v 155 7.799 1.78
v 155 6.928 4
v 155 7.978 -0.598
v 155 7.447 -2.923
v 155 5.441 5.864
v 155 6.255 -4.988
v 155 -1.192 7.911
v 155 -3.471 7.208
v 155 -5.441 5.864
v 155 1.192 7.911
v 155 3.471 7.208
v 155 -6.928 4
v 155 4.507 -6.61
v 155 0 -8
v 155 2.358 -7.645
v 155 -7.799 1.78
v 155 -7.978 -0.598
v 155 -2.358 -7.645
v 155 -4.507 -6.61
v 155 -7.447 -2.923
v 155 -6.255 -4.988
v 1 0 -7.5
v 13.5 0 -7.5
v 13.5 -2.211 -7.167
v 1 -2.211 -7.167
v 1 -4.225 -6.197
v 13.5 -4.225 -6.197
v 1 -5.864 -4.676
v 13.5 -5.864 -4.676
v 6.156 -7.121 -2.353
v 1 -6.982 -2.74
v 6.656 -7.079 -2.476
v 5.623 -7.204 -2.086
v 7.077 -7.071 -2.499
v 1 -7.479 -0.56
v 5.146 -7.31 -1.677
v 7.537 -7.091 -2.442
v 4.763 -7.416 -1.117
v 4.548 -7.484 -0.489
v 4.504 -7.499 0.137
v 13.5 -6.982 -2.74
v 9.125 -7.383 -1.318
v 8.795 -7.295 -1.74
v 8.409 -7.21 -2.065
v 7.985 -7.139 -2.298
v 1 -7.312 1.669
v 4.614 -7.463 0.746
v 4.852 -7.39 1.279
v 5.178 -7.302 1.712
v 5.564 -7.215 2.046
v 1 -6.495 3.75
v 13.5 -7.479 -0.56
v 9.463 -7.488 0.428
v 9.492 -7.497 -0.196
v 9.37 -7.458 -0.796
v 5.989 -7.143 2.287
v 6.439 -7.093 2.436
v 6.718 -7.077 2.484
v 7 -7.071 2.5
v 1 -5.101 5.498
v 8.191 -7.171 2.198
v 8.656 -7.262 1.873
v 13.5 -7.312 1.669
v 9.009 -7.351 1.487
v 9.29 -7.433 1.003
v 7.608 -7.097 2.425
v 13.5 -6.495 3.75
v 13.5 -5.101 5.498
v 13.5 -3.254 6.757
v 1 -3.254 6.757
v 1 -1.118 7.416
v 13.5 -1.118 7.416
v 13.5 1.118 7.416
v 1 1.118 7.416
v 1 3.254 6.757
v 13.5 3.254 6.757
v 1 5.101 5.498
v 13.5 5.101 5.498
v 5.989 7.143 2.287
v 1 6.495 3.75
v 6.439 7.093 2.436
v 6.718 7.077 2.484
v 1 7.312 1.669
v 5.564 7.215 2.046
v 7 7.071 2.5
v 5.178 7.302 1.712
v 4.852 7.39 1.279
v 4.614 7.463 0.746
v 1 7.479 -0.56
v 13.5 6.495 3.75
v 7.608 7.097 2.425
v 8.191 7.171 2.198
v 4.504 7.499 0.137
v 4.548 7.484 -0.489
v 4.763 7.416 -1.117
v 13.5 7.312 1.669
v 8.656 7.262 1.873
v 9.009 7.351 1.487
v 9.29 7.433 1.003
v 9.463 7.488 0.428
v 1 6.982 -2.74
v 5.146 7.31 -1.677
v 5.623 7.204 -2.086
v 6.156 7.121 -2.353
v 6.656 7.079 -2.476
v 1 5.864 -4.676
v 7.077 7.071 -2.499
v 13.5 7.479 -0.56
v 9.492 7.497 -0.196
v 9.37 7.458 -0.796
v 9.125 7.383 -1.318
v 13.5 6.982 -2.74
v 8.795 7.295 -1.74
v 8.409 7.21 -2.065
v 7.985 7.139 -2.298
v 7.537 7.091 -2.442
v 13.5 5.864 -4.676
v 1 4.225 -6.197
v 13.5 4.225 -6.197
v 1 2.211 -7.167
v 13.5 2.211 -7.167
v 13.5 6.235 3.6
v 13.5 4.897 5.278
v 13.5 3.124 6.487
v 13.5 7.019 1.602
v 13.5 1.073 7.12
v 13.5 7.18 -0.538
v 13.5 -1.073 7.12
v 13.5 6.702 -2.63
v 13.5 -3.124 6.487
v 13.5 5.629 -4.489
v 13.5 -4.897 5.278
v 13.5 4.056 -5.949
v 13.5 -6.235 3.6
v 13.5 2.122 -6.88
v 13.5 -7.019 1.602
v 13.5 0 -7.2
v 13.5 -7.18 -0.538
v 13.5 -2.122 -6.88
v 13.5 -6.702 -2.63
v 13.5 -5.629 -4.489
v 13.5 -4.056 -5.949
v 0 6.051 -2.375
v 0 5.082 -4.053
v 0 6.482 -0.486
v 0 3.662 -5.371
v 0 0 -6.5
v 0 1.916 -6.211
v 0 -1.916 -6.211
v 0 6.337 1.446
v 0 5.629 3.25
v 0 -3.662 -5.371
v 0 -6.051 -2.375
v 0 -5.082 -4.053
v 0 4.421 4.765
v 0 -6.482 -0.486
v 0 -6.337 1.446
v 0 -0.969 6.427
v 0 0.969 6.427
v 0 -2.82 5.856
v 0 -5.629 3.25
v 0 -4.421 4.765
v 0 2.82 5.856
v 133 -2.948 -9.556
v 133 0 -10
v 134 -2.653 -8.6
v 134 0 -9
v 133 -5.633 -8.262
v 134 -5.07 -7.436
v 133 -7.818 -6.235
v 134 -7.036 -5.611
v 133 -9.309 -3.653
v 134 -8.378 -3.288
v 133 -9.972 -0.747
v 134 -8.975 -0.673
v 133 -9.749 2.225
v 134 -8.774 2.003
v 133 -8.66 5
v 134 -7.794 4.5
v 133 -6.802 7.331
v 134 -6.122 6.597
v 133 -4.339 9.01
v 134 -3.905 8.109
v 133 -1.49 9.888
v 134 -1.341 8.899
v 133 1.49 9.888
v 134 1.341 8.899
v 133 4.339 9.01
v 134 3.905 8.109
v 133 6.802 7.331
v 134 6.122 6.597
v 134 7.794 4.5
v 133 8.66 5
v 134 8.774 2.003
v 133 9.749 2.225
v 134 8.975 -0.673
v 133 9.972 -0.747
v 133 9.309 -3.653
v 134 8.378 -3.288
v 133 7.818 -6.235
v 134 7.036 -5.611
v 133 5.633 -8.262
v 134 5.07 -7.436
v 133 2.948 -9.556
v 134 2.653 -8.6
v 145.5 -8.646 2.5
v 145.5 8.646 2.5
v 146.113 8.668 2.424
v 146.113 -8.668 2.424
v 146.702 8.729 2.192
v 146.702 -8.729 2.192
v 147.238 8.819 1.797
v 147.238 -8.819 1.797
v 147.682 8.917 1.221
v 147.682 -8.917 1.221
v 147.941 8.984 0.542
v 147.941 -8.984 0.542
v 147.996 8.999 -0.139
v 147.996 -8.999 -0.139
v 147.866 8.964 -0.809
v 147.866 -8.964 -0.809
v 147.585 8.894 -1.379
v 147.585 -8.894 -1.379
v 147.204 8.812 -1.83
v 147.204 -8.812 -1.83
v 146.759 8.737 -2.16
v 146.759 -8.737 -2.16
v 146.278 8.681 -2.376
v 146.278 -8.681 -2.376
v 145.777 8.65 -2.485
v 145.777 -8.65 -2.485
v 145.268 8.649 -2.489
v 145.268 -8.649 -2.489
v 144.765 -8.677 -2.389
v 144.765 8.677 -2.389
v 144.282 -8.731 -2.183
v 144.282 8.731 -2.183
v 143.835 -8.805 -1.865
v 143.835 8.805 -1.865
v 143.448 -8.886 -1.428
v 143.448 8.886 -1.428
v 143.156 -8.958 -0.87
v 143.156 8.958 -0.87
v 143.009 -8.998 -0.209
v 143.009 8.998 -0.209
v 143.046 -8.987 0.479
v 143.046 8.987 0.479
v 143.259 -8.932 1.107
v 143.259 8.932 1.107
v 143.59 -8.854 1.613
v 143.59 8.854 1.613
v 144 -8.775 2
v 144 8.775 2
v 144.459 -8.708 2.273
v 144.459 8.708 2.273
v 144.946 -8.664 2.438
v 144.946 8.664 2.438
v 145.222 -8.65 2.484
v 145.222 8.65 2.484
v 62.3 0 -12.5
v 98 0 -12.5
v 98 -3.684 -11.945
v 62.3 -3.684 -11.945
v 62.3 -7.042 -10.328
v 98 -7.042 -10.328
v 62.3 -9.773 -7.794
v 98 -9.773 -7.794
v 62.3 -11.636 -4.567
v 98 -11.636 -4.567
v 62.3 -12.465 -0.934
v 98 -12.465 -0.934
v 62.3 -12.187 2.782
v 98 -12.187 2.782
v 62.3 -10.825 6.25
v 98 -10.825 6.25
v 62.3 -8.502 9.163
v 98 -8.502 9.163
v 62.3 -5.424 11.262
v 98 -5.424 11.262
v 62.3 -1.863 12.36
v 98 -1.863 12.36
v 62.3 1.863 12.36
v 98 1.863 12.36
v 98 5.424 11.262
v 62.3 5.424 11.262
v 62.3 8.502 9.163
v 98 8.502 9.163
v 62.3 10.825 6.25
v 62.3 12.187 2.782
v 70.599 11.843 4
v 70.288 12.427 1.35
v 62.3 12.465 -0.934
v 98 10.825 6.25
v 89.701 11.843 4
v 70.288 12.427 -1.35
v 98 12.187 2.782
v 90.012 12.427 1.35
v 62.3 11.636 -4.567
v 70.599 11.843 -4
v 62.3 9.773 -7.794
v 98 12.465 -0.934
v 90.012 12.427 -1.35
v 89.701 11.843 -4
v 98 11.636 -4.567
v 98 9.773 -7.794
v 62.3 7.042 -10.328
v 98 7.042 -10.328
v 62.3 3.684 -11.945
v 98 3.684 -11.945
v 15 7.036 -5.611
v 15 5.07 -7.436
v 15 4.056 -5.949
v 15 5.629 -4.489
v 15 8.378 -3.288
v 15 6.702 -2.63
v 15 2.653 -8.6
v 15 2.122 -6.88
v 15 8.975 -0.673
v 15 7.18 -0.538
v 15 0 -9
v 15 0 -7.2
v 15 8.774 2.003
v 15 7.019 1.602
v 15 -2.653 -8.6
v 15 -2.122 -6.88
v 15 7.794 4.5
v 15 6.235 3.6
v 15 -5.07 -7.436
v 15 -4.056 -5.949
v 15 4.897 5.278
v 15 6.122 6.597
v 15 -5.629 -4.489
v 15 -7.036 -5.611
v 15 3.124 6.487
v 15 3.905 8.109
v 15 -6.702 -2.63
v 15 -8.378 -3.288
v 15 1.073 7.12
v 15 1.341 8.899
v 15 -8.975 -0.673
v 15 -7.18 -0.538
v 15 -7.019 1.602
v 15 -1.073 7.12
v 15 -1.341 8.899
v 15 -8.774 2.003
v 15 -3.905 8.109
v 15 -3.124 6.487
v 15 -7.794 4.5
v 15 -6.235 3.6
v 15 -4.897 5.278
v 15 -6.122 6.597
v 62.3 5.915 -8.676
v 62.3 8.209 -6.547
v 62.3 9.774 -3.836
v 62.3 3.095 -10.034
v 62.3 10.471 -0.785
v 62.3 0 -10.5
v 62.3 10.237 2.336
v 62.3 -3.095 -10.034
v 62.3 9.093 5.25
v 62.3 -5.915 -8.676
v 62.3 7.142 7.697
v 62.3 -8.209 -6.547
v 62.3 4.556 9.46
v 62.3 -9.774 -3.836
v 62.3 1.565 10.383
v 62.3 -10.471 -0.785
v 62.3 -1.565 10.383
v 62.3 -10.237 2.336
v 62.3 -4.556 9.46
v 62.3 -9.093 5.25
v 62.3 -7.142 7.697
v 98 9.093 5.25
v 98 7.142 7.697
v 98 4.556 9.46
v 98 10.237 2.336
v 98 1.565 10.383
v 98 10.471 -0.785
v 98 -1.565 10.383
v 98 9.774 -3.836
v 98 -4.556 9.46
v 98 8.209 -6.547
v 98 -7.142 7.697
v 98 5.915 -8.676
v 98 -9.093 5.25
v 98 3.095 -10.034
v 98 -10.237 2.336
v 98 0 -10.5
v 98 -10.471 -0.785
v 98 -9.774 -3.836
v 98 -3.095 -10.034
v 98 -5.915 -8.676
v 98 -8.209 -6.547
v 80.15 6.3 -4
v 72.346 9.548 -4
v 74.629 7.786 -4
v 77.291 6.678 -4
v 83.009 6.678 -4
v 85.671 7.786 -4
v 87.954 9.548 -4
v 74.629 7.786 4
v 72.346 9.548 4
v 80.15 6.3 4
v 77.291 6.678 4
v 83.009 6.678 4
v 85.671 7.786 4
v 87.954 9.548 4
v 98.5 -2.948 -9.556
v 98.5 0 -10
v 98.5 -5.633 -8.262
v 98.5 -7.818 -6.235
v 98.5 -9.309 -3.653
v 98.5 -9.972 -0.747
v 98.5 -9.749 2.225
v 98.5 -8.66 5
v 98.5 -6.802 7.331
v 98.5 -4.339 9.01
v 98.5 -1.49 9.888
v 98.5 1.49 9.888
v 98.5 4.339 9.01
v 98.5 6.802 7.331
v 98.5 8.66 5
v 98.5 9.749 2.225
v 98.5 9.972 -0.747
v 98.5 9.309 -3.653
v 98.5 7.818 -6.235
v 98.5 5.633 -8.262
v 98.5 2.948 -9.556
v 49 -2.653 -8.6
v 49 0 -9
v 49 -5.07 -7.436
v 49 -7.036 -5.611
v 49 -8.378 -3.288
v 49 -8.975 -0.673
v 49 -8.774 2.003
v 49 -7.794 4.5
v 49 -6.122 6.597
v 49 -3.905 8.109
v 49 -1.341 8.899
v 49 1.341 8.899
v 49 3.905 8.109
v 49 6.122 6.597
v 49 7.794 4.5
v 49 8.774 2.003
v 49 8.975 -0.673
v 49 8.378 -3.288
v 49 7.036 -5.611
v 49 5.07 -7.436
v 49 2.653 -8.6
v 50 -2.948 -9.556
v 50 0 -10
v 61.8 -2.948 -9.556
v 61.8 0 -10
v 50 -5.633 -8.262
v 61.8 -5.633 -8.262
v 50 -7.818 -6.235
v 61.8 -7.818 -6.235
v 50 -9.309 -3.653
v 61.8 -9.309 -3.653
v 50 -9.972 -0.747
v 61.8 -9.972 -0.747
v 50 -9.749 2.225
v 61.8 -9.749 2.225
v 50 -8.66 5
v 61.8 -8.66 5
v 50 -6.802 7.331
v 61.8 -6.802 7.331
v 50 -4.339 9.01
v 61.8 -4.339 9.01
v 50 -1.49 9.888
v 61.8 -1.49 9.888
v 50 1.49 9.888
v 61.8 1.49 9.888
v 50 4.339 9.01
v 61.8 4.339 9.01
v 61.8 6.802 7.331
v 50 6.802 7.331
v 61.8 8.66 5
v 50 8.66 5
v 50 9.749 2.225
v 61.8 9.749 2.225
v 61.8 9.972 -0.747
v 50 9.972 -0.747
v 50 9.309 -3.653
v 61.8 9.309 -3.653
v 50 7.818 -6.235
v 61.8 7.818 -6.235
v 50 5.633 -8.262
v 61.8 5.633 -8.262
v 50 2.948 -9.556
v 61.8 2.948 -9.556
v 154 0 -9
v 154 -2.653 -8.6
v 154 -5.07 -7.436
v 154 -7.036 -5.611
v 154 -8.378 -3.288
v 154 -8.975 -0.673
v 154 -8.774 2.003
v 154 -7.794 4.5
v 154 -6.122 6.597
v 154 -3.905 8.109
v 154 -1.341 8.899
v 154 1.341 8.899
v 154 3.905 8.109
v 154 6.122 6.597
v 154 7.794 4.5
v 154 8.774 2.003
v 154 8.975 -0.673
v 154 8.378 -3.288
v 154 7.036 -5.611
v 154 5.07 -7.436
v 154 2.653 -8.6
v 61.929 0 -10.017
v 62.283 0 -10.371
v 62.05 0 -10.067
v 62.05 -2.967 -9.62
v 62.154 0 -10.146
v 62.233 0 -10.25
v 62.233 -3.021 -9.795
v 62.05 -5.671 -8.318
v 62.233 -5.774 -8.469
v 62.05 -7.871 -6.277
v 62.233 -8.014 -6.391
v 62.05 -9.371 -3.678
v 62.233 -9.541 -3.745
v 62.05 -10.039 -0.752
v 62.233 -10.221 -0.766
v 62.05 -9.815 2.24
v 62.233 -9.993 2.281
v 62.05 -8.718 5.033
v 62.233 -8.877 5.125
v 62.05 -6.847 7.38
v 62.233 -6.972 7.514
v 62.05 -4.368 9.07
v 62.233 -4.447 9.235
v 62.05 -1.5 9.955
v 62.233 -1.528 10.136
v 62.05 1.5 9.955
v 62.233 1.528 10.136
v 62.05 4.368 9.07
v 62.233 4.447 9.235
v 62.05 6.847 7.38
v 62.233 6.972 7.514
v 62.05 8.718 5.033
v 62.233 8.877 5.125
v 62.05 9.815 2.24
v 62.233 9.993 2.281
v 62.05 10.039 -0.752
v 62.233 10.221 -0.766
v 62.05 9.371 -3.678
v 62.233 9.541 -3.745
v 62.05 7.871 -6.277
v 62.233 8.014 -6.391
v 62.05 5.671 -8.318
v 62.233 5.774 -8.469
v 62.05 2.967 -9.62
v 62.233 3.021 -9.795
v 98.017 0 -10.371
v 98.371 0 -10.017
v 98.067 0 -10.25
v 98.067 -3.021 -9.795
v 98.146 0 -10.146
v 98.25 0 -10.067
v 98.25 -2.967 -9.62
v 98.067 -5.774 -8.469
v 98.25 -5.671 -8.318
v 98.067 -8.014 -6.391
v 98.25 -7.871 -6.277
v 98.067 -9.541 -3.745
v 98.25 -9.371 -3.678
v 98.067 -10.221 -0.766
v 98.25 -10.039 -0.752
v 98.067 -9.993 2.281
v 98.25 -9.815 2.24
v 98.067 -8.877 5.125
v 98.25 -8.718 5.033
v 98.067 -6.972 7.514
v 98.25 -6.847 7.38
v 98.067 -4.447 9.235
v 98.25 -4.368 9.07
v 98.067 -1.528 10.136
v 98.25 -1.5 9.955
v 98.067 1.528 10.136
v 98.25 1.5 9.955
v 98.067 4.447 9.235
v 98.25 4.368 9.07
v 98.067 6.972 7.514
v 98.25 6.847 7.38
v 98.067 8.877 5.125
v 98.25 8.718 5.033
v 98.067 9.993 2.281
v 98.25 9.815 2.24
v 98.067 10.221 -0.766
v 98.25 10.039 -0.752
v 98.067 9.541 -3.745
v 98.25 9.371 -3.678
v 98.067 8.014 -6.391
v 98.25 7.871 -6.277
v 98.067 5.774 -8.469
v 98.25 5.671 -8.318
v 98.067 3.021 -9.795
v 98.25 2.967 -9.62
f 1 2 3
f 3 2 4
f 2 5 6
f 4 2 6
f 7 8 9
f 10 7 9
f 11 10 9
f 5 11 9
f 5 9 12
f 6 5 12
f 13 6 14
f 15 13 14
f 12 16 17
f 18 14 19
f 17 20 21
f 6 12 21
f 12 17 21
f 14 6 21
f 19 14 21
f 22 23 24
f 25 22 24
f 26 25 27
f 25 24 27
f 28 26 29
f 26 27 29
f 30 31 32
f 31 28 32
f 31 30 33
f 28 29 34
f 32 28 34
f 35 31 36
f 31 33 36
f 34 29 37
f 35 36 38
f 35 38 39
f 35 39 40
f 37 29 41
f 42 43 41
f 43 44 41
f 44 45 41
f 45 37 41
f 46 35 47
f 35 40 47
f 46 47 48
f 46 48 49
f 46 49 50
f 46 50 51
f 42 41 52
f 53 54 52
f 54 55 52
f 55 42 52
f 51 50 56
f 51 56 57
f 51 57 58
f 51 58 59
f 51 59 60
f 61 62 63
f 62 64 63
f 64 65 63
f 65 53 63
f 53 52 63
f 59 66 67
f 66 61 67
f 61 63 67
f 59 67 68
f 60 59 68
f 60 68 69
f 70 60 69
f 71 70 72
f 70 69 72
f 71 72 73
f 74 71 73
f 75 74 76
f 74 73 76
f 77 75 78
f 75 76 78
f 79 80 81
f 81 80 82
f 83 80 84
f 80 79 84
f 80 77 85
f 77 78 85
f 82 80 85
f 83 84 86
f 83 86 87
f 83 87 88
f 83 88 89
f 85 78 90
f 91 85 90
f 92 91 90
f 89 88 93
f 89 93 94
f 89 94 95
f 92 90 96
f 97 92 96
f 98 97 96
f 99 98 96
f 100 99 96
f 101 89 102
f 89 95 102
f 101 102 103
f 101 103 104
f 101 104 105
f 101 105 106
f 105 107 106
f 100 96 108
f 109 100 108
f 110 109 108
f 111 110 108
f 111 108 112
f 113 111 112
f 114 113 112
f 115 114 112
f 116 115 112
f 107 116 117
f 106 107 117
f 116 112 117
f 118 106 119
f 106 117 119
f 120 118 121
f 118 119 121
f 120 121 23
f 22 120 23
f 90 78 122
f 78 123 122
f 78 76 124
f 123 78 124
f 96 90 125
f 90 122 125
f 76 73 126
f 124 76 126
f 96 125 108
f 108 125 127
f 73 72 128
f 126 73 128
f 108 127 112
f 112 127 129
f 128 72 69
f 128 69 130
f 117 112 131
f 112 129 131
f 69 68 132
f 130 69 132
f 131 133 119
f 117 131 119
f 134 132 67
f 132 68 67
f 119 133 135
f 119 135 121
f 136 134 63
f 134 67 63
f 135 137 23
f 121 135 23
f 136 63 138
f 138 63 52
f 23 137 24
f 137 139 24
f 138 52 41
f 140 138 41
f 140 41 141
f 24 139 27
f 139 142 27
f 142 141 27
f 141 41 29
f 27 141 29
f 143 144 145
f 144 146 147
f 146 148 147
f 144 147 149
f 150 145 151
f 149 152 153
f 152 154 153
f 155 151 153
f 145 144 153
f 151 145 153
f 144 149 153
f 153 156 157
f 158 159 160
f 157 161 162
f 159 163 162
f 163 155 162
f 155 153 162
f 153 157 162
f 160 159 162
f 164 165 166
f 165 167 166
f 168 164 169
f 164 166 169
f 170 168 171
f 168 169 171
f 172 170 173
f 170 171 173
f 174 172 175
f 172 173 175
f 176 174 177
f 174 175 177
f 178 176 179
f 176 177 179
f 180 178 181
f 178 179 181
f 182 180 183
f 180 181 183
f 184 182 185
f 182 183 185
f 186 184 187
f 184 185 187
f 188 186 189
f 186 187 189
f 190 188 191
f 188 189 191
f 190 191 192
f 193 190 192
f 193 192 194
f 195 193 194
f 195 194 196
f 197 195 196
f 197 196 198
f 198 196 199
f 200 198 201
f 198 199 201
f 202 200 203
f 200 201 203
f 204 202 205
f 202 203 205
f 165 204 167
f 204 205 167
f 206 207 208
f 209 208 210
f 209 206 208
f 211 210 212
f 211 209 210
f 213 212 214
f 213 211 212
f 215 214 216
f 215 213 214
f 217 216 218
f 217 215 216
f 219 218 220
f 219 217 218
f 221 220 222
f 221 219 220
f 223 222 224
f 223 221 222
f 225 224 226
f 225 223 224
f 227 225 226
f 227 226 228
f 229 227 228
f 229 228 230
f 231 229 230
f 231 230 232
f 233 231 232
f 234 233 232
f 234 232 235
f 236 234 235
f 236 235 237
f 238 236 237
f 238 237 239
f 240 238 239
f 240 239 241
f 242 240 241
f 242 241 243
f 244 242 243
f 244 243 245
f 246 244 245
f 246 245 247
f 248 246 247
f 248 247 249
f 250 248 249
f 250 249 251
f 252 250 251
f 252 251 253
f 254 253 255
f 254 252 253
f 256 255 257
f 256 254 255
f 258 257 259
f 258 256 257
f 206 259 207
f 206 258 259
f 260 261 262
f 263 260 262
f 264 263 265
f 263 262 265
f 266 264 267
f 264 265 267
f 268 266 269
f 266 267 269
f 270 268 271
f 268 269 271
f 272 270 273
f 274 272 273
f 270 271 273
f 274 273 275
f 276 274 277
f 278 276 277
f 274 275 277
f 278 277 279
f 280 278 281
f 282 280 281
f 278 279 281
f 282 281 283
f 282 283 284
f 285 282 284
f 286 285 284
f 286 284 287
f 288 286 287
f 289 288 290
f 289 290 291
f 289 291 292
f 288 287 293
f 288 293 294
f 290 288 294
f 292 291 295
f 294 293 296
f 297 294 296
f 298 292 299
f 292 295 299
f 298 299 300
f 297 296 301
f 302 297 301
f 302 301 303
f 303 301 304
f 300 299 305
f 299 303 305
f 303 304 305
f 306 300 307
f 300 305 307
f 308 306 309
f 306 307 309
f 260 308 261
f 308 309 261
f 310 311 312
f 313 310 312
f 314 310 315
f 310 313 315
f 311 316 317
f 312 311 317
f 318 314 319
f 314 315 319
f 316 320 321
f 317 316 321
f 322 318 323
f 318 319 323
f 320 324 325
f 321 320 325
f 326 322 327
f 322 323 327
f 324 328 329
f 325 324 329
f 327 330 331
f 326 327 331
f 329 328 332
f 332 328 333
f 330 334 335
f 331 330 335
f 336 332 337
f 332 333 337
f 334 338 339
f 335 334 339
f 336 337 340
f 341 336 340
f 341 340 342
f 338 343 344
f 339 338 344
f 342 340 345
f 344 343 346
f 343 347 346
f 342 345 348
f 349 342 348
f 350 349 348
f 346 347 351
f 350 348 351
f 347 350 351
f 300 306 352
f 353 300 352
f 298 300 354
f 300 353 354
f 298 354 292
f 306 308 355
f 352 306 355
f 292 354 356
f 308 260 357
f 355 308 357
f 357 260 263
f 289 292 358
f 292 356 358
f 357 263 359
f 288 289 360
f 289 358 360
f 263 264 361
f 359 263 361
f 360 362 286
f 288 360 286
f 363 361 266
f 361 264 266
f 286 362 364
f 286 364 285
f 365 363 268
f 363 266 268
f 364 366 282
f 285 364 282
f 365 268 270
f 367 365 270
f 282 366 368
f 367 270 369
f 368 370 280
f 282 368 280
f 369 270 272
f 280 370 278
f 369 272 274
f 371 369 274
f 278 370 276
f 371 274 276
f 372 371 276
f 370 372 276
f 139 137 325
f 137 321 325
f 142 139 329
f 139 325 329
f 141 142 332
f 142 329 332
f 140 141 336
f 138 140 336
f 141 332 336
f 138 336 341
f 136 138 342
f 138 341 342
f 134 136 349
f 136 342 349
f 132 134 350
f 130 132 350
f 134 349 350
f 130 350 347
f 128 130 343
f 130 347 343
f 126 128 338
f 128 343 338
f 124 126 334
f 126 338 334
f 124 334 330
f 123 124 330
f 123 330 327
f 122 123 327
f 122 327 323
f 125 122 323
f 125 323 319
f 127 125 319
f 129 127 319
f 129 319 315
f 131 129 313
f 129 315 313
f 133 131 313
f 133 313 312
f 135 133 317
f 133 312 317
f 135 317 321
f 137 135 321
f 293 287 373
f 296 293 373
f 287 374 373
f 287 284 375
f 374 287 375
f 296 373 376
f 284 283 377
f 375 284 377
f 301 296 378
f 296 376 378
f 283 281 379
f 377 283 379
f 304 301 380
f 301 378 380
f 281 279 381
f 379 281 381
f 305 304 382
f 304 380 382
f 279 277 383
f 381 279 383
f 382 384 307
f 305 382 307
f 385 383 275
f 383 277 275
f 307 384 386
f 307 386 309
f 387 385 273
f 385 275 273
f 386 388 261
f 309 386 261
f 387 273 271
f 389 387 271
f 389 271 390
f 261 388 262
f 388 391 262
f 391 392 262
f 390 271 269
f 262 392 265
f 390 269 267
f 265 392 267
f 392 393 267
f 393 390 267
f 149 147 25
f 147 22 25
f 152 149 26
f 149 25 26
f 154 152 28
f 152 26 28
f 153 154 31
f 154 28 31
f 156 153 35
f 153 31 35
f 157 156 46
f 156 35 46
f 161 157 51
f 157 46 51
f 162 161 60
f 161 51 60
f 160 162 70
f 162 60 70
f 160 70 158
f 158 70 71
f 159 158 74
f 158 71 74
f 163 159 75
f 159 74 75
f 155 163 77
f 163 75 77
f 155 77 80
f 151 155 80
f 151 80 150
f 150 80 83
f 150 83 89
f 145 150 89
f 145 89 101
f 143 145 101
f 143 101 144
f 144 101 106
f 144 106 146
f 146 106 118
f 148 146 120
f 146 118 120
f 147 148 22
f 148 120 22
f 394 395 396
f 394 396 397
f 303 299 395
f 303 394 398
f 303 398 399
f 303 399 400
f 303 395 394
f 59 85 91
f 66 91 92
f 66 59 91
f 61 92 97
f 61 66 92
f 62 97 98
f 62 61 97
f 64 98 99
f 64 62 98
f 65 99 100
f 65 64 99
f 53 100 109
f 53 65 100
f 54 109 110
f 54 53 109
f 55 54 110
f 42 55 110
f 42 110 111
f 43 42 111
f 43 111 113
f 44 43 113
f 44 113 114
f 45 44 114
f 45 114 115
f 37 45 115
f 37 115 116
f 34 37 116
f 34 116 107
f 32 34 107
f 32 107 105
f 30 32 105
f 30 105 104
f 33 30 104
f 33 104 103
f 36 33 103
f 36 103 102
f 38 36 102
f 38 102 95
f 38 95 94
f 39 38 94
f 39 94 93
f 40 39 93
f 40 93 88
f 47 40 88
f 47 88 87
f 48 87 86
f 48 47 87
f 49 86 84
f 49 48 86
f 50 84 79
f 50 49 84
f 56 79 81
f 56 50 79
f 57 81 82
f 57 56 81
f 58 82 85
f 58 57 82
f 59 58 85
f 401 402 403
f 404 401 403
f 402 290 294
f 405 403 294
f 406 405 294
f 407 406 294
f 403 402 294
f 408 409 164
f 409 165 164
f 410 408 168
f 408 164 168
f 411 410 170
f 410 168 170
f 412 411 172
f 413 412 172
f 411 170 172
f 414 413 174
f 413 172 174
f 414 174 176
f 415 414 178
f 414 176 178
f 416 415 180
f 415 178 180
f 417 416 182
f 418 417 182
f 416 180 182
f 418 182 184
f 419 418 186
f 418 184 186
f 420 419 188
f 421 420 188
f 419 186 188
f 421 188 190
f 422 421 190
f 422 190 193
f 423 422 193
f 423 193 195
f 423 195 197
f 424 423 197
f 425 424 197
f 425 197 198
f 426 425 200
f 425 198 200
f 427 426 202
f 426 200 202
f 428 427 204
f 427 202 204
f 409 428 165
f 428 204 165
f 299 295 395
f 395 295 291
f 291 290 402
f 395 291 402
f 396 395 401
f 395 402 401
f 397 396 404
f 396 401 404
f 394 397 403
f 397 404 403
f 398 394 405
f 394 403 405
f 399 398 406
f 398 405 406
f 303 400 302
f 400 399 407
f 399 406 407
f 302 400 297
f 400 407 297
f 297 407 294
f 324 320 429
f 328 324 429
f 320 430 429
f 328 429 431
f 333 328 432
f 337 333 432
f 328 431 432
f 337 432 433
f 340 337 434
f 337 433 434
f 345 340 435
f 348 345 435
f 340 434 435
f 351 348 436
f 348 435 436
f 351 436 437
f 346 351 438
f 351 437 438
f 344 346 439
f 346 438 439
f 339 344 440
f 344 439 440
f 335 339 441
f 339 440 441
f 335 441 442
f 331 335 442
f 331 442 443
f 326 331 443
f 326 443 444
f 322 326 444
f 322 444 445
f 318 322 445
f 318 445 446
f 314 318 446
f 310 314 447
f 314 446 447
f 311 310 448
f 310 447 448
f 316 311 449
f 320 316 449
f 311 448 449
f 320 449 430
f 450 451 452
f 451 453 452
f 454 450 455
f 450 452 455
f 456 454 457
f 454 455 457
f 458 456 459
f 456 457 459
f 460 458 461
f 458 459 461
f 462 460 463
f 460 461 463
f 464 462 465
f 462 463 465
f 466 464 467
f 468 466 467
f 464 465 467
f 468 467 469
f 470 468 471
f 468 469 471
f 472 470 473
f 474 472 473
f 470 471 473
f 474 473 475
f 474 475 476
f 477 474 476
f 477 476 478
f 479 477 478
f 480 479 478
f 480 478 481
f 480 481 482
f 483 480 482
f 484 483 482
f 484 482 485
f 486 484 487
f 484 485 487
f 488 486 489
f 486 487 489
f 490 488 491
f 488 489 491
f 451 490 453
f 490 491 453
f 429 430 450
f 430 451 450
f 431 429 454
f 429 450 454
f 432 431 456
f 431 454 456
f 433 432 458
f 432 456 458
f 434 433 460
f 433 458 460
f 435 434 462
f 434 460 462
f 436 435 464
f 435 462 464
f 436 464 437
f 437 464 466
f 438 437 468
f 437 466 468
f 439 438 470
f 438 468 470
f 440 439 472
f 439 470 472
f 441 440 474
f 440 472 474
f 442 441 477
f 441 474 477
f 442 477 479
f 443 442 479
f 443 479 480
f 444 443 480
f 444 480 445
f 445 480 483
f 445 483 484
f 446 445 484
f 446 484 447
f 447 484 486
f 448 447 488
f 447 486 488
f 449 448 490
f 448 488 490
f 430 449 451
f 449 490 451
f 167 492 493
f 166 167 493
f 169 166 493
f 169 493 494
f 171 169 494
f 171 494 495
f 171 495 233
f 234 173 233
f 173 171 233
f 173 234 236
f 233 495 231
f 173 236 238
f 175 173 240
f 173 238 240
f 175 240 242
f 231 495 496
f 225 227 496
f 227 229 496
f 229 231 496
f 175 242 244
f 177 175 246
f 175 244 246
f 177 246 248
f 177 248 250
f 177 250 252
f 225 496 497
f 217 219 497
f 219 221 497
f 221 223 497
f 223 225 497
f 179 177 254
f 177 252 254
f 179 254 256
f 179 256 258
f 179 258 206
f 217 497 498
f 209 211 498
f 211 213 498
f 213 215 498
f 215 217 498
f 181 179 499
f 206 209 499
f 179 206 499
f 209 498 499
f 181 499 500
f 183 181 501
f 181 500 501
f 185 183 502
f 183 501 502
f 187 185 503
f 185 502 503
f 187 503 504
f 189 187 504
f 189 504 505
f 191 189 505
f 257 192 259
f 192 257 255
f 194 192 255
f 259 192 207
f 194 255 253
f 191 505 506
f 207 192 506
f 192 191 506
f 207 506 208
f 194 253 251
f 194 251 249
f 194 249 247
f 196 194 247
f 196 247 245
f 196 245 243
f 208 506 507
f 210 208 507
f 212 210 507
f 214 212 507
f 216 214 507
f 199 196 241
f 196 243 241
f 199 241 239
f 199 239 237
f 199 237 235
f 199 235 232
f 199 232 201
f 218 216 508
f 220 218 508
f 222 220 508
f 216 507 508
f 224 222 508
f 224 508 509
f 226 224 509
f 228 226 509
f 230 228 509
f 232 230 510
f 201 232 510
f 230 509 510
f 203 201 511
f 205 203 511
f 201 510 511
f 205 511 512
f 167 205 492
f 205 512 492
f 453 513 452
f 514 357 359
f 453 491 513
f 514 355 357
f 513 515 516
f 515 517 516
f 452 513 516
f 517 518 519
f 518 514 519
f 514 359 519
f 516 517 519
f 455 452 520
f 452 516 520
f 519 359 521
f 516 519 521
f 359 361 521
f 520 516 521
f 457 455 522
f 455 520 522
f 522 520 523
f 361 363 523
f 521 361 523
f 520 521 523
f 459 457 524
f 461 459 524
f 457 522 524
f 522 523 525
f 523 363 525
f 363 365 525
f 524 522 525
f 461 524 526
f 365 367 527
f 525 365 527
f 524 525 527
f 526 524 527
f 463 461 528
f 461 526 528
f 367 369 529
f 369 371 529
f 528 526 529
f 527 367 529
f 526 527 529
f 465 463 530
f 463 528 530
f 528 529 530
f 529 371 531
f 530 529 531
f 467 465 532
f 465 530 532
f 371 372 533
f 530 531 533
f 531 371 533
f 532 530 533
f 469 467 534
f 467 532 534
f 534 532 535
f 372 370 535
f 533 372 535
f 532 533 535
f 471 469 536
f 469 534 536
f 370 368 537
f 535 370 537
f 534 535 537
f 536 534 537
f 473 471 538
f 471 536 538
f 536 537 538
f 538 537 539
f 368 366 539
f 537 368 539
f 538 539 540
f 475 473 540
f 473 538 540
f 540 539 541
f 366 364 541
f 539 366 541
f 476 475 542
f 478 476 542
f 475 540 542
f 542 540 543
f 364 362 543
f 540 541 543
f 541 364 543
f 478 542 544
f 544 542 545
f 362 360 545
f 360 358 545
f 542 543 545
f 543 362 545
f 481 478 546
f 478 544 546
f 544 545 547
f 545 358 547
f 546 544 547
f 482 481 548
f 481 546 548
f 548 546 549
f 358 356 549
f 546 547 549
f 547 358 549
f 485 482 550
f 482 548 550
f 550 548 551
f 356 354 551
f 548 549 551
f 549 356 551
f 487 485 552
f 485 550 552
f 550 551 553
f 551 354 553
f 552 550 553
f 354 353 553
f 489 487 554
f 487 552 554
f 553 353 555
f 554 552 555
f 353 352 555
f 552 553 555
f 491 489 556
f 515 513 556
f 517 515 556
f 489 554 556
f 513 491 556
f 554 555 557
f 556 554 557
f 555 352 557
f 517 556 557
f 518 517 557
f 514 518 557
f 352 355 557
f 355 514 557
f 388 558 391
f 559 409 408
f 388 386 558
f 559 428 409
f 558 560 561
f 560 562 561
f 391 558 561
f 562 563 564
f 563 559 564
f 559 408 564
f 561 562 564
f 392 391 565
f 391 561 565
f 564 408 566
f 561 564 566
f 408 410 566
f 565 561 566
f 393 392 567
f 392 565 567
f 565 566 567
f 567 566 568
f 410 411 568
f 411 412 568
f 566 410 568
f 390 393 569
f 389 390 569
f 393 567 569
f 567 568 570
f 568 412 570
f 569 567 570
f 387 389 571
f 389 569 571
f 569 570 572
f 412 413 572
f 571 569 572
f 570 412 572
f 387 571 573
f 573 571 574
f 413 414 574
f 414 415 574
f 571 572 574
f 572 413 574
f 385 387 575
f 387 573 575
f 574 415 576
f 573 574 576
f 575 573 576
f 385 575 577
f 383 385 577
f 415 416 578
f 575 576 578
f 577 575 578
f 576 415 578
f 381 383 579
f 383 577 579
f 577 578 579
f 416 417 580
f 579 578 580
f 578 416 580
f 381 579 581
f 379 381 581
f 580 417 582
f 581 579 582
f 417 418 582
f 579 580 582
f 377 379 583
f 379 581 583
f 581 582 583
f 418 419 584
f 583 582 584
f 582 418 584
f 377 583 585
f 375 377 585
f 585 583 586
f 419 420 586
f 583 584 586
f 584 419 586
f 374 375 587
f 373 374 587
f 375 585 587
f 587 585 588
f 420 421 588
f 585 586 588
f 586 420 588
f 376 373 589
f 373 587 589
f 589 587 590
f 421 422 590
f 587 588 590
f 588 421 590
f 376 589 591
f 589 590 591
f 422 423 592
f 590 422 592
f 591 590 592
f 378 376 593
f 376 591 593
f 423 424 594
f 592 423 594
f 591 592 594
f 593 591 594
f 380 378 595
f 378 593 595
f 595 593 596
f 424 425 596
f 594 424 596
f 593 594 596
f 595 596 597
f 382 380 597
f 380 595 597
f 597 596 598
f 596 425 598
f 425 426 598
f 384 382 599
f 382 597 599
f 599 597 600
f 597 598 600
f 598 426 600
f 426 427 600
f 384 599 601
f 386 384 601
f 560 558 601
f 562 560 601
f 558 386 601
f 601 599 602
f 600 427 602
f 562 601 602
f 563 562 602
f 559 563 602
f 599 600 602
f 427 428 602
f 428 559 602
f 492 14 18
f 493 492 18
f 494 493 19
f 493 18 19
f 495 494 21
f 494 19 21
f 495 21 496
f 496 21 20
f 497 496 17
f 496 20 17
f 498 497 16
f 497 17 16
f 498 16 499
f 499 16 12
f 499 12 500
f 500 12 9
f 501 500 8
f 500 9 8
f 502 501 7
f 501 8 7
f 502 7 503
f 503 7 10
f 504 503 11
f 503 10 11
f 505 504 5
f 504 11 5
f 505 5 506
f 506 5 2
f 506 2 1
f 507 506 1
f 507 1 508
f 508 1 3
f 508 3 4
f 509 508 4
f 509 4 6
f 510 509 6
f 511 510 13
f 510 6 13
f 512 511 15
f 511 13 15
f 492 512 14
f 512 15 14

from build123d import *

# Parameters (mm, degrees)
CHAMFER1_SIZE           = 1
SKETCH2_R               = 11
CUT_EXTRUDE1_DEPTH      = 4
CUT_EXTRUDE2_DEPTH      = 157.004807634
CUT_EXTRUDE2_DEPTH_BACK = 157.004807634
SKETCH3_R               = 2.5


with BuildPart() as part:
    # Sketch1 → Revolve1 (revolve)
    with BuildSketch(Plane.XY, mode=Mode.PRIVATE) as revolve1_sk:
        with BuildLine():
            Line((0, 0), (0, 6.5))
            Line((0, 6.5), (1, 7.5))
            Line((1, 7.5), (13.5, 7.5))
            Line((13.5, 7.5), (13.5, 7.2))
            Line((13.5, 7.2), (15, 7.2))
            Line((15, 7.2), (15, 9))
            Line((15, 9), (49, 9))
            Line((49, 9), (50, 10))
            Line((50, 10), (61.8, 10))
            ThreePointArc((61.8, 10), (62.153553391, 10.146446609), (62.3, 10.5))
            Line((62.3, 10.5), (62.3, 12.5))
            Line((62.3, 12.5), (98, 12.5))
            Line((98, 12.5), (98, 10.5))
            ThreePointArc((98, 10.5), (98.146446609, 10.146446609), (98.5, 10))
            Line((98.5, 10), (133, 10))
            Line((133, 10), (134, 9))
            Line((134, 9), (155, 9))
            Line((155, 9), (155, 0))
            Line((155, 0), (0, 0))
        make_face()
    revolve(revolve1_sk.sketch.rotate(Axis((155, 0, 0), (-1, 0, 0)), 90), axis=Axis((155, 0, 0), (-1, 0, 0)))

    # Chamfer1
    chamfer1_edges = [part.edges().sort_by_distance(p)[0] for p in [
        (155, 0, 9),
    ]]
    chamfer(chamfer1_edges, length=CHAMFER1_SIZE)

    # Sketch2 → Cut-Extrude1 (cut, symmetric)
    with BuildSketch(Plane.XY):
        with Locations((80.15, 17.3)):
            Circle(SKETCH2_R)
    extrude(amount=CUT_EXTRUDE1_DEPTH, both=True, mode=Mode.SUBTRACT)

    # Sketch3 → Cut-Extrude2 (cut, two sides: drawn at the far end of the back side and taken through both)
    with BuildSketch(Plane(origin=(0, 0, 0), x_dir=(1, 0, 0), z_dir=(0, 1, 0)).offset(-CUT_EXTRUDE2_DEPTH_BACK)):
        with Locations(Location((7, 0, 0), (0, 0, 270))):
            Circle(SKETCH3_R)
        with Locations(Location((145.5, 0, 0), (0, 0, 270))):
            Circle(SKETCH3_R)
    extrude(amount=CUT_EXTRUDE2_DEPTH + CUT_EXTRUDE2_DEPTH_BACK, mode=Mode.SUBTRACT)


solid = part.part
